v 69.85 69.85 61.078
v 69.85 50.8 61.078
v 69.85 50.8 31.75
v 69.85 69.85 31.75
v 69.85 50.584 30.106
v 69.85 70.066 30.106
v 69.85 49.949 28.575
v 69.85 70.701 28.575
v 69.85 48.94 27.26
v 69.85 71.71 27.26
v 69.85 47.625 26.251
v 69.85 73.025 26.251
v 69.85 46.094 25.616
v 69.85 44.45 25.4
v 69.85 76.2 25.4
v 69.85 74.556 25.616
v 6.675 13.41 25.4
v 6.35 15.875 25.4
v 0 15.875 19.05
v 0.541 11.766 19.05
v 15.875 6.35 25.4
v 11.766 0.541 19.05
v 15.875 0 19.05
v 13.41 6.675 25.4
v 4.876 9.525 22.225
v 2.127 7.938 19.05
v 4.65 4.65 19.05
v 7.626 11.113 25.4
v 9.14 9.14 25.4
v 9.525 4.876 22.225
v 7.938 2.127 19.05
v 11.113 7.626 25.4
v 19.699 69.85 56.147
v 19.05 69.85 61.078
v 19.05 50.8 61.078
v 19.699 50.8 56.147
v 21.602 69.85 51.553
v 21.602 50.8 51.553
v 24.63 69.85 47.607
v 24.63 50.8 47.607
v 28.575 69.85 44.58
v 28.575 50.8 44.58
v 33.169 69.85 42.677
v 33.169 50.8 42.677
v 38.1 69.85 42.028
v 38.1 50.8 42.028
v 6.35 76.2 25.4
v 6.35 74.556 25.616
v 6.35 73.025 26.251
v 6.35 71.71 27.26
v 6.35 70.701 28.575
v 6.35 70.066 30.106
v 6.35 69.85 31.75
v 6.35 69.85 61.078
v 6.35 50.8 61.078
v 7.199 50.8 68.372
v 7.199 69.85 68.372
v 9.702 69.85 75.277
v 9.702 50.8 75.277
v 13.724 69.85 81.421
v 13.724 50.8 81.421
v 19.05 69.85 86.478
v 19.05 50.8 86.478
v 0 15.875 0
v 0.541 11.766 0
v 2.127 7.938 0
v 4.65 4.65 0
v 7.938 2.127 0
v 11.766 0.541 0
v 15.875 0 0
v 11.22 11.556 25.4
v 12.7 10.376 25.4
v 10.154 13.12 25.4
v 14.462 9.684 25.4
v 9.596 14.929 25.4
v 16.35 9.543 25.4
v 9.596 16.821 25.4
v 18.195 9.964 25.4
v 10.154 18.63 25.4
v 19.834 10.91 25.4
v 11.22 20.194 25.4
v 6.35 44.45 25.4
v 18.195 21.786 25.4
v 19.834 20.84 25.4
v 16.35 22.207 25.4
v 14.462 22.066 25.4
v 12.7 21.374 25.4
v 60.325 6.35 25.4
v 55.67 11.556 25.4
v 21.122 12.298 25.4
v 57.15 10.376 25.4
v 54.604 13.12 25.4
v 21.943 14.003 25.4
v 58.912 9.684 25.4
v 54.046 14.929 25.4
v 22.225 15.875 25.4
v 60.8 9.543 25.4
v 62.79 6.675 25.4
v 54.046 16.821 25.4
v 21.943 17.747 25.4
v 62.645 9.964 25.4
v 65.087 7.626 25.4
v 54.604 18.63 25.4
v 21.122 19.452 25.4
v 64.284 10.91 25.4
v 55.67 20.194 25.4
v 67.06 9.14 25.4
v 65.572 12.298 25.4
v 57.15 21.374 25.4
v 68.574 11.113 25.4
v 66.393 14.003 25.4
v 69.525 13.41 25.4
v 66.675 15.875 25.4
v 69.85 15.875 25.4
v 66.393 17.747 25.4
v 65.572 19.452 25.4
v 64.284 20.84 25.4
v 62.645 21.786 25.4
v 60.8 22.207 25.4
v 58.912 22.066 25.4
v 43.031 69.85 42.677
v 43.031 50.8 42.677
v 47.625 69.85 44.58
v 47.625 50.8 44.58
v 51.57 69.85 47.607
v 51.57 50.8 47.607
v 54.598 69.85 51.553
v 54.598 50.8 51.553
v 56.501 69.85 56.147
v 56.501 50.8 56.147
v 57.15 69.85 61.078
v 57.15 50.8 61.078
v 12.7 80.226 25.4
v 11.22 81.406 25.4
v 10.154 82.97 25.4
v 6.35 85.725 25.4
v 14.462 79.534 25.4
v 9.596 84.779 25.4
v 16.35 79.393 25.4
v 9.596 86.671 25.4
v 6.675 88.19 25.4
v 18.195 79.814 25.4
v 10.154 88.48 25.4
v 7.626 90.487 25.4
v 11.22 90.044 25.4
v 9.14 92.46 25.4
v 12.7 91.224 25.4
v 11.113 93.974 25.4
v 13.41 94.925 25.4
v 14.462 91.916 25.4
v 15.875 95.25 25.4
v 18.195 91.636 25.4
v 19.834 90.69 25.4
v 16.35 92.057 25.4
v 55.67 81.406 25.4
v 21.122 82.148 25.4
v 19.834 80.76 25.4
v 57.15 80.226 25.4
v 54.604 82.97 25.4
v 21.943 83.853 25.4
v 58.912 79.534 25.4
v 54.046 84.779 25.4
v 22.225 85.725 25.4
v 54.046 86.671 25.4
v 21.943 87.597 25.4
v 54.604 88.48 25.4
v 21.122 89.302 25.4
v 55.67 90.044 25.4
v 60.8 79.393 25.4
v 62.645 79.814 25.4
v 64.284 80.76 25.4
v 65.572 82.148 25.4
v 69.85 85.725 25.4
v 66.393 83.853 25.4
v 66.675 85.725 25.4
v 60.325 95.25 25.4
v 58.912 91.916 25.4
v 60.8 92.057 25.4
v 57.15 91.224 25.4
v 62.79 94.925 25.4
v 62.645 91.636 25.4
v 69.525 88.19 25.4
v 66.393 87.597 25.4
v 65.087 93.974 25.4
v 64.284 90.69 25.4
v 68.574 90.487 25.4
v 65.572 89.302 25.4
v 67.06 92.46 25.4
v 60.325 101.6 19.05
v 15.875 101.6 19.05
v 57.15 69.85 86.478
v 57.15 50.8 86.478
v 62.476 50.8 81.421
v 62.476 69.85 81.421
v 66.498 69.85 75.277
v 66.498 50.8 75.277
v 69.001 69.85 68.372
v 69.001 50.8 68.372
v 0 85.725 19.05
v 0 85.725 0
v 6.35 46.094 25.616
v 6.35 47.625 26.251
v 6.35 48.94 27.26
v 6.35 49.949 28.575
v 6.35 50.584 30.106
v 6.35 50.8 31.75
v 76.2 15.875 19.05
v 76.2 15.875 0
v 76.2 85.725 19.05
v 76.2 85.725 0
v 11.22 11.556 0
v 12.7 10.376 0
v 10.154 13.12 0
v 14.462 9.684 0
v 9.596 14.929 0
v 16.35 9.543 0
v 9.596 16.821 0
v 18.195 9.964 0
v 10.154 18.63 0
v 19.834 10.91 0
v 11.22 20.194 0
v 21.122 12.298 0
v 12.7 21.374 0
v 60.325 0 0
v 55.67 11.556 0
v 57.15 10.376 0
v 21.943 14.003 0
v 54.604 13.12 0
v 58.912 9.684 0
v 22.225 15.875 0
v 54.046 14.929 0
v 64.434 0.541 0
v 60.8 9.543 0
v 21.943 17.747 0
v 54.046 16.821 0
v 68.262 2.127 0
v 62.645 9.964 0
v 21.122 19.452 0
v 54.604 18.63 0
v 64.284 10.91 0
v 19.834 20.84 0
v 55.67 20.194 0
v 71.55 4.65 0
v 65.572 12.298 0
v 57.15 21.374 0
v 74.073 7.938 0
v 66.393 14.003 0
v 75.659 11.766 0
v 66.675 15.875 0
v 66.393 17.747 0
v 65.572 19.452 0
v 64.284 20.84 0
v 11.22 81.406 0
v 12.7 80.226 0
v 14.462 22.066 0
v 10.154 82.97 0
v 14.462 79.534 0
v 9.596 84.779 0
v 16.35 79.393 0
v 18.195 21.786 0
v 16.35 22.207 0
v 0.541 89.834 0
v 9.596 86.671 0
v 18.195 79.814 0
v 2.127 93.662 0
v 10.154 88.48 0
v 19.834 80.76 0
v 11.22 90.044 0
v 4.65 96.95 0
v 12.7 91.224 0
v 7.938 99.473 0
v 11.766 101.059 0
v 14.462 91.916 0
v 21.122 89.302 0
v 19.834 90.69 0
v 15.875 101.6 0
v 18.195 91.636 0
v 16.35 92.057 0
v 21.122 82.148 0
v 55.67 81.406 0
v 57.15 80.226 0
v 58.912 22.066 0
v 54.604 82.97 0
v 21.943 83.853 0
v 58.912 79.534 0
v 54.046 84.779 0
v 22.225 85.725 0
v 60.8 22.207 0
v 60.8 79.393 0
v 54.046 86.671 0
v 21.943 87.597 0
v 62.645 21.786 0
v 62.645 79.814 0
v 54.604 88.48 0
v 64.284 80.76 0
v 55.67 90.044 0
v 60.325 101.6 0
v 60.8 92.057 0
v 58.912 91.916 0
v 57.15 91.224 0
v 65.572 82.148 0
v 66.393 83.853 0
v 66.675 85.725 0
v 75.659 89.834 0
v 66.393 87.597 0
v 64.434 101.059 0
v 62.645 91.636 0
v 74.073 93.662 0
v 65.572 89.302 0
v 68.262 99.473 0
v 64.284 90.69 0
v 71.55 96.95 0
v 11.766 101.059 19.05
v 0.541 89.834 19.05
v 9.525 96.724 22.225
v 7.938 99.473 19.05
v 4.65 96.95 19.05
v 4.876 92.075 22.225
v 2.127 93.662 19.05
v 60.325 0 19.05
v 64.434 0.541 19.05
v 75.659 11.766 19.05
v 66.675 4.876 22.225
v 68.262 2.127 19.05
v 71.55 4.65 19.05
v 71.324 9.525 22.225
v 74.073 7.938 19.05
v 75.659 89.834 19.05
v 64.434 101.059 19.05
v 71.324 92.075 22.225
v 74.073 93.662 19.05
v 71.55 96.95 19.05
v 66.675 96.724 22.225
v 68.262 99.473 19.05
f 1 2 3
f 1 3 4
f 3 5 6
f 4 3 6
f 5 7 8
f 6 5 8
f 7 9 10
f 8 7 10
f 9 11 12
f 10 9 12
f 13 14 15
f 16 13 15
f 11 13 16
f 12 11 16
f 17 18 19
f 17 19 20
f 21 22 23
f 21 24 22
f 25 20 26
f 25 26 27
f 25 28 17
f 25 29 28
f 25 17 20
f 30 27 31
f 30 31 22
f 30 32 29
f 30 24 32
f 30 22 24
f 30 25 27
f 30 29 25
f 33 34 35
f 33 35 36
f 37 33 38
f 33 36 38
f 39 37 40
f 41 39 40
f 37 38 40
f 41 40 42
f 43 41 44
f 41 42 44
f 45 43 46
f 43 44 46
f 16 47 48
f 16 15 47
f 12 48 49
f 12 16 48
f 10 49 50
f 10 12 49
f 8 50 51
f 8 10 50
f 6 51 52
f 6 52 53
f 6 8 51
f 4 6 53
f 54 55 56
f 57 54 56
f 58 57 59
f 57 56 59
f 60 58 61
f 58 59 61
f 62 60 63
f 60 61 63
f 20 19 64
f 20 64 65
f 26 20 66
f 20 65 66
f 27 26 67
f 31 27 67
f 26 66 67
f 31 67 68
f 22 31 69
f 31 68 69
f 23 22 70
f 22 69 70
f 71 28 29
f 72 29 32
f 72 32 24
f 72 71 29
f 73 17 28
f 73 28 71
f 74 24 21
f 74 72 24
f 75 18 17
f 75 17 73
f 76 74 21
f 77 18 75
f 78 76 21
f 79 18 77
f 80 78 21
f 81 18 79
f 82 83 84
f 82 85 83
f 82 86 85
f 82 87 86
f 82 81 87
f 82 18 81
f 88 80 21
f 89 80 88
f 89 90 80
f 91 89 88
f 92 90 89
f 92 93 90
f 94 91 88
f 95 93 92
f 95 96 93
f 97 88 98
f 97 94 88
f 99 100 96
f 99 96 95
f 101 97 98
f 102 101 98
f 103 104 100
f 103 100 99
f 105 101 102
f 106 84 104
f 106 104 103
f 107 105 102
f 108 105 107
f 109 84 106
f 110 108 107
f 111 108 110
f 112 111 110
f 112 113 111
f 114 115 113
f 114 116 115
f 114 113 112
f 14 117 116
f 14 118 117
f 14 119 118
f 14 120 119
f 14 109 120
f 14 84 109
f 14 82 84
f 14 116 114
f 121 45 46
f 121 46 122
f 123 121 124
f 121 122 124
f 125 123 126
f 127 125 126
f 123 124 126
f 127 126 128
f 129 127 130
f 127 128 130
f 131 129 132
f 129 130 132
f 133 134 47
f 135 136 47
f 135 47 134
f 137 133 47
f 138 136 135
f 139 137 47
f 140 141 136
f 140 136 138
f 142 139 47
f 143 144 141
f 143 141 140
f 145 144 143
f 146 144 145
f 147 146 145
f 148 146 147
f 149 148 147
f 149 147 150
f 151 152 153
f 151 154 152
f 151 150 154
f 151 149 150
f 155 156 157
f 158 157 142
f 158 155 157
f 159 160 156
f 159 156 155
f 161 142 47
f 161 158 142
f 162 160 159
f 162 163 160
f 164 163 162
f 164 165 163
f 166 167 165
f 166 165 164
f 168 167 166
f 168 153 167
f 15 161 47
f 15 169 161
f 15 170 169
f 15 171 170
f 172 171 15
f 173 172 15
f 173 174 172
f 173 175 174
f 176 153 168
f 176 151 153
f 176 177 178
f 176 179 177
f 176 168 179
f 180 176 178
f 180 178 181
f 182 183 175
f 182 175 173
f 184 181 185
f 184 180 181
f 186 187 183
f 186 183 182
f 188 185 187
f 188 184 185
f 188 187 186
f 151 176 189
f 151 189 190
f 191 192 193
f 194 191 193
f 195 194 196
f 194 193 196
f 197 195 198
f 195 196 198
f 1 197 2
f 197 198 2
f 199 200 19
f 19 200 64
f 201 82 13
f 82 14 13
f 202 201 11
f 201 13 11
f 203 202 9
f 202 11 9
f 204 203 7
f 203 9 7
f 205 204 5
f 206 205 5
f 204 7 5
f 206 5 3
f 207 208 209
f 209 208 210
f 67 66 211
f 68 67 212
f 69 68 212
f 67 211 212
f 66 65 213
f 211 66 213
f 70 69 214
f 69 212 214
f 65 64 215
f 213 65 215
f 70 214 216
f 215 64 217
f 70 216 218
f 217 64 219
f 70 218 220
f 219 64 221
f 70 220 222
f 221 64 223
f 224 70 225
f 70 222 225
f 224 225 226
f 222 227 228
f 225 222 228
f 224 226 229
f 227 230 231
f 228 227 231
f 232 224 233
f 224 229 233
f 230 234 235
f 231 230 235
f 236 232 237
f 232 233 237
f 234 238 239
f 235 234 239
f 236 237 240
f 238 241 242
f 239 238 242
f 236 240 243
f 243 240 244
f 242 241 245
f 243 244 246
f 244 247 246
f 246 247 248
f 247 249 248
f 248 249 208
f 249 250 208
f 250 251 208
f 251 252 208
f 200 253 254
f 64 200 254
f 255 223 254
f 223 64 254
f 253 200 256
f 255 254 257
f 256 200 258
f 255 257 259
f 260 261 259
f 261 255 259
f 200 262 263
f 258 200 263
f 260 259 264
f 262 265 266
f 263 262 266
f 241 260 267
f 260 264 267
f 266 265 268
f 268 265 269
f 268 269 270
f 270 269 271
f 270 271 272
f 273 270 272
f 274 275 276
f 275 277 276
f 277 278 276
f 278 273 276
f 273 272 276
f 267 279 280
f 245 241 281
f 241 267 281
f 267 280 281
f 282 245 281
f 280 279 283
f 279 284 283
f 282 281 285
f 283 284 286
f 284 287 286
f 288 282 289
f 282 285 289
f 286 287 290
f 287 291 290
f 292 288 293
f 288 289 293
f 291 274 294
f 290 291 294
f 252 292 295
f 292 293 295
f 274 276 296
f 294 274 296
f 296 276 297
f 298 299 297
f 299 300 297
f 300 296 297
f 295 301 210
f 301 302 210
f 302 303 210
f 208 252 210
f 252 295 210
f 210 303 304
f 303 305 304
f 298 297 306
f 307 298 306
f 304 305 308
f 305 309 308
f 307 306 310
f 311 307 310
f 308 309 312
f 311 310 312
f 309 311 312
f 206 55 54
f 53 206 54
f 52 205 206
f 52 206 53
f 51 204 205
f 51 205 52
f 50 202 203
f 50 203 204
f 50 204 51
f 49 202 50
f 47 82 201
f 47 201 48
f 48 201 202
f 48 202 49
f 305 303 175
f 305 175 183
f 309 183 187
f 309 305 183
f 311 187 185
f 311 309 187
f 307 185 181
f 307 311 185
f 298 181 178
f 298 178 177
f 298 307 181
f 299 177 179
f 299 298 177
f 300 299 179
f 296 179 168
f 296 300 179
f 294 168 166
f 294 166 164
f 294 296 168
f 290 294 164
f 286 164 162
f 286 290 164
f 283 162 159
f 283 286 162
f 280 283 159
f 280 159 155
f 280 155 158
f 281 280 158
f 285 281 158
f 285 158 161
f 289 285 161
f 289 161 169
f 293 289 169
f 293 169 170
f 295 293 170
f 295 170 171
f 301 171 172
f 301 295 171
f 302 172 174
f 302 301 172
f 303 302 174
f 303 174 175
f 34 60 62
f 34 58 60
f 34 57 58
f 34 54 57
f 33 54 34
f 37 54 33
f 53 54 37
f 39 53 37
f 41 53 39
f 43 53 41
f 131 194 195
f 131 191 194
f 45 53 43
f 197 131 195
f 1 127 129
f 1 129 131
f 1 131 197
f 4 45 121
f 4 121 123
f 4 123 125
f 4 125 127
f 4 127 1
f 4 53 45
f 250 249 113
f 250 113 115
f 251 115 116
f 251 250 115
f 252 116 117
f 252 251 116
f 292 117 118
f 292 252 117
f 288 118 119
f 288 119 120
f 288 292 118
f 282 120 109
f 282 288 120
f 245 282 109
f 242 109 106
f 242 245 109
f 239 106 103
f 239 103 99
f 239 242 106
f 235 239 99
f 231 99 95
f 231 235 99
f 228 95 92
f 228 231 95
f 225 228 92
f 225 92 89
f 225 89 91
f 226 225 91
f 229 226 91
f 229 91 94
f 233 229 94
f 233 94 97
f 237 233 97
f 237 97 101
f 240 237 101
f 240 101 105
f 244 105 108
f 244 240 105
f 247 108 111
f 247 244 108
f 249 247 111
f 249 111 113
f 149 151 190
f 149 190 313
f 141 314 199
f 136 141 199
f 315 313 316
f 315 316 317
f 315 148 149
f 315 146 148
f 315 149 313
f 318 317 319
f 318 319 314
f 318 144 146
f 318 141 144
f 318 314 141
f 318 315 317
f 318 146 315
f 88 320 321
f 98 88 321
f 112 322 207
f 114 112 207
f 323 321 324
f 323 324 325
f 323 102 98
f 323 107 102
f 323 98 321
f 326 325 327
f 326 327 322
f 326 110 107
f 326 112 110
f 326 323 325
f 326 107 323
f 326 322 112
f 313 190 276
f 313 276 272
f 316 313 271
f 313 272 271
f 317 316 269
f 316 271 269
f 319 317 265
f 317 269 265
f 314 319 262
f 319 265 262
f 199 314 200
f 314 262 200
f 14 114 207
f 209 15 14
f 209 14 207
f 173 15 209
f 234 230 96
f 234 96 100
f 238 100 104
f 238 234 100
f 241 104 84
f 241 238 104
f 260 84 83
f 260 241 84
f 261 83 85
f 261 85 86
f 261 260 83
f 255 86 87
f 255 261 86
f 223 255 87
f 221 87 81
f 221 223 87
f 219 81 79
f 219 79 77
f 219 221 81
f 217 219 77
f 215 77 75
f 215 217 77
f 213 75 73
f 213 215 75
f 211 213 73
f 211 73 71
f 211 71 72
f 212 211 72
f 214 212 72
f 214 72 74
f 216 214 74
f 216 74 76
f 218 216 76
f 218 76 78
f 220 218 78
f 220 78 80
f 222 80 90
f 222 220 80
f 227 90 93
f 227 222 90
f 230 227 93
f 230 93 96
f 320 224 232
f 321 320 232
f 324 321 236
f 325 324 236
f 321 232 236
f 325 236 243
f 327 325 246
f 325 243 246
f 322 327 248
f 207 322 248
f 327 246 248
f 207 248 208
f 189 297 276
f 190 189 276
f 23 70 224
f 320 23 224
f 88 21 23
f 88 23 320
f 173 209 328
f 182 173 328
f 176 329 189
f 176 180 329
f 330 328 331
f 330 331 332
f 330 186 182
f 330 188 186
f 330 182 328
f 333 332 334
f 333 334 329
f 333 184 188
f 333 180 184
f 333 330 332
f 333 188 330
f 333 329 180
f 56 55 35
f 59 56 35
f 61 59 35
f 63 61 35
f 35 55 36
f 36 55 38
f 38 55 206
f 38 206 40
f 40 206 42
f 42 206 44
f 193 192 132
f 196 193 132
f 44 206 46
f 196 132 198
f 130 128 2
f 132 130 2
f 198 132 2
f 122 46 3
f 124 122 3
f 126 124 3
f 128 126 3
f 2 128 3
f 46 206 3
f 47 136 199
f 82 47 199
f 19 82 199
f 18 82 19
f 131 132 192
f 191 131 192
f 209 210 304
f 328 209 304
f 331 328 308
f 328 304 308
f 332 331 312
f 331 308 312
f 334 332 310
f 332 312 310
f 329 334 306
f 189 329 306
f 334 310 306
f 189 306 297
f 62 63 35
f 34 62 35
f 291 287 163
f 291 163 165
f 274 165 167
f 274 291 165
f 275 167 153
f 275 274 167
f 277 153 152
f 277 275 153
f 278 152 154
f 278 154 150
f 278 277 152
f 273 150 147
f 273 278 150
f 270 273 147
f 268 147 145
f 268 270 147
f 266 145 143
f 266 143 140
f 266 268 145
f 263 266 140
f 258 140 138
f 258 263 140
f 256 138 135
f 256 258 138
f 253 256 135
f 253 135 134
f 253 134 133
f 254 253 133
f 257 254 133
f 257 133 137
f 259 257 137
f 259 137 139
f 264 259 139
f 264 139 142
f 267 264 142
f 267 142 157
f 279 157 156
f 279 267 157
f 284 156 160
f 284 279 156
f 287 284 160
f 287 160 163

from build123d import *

# Parameters (mm, degrees)
F0_R     = 6.35
F1_DEPTH = 25.4
F2_SIZE  = 6.35
F3_W     = 63.5
F3_H     = 19.05
F4_DEPTH = 95.25
F5_R     = 6.35
F7_DEPTH = 50.801


with BuildPart() as f1:
    # F0 (on Top) → F1 (new body)
    with BuildSketch(Plane.XY):
        with BuildLine():
            ThreePointArc((0, 15.875), (4.6496798487, 4.6496798487), (15.875, 0))
            Line((15.875, 0), (60.325, 0))
            ThreePointArc((60.325, 0), (71.5503201513, 4.6496798487), (76.2, 15.875))
            Line((76.2, 15.875), (76.2, 85.725))
            ThreePointArc((76.2, 85.725), (71.5503201513, 96.9503201513), (60.325, 101.6))
            Line((60.325, 101.6), (15.875, 101.6))
            ThreePointArc((15.875, 101.6), (4.6496798487, 96.9503201513), (0, 85.725))
            Line((0, 85.725), (0, 15.875))
        make_face()
        with Locations((15.875, 15.875)):
            Circle(F0_R, mode=Mode.SUBTRACT)
        with Locations((60.325, 15.875)):
            Circle(F0_R, mode=Mode.SUBTRACT)
        with Locations((15.875, 85.725)):
            Circle(F0_R, mode=Mode.SUBTRACT)
        with Locations((60.325, 85.725)):
            Circle(F0_R, mode=Mode.SUBTRACT)
    extrude(amount=F1_DEPTH)

    # F2
    f2_edges = [f1.edges().sort_by_distance(p)[0] for p in [
        (38.1, 0, 25.4),
        (0, 50.8, 25.4),
        (4.64968, 4.64968, 25.4),
        (71.55032, 4.64968, 25.4),
        (76.2, 50.8, 25.4),
        (71.55032, 96.95032, 25.4),
        (38.1, 101.6, 25.4),
        (4.64968, 96.95032, 25.4),
    ]]
    chamfer(f2_edges, length=F2_SIZE)

    # F3 (on face) → F4 (join)
    with BuildSketch(Plane.XY.offset(25.4)):
        with Locations((38.1, 60.325)):
            Rectangle(F3_W, F3_H)
    extrude(amount=F4_DEPTH)

    # F5
    f5_edges = [f1.edges().sort_by_distance(p)[0] for p in [
        (38.1, 50.8, 25.4),
        (38.1, 69.85, 25.4),
    ]]
    fillet(f5_edges, radius=F5_R)

    # F6 (on face) → F7 (cut, through all)
    with BuildSketch(Plane.XZ.offset(-50.8)):
        with BuildLine():
            Line((6.35, 120.65), (6.35, 61.0775296334))
            ThreePointArc((6.35, 61.0775296334), (9.7019366858, 75.2765612905), (19.05, 86.4775296334))
            Line((19.05, 86.4775296334), (19.05, 120.65))
            Line((19.05, 120.65), (6.35, 120.65))
        make_face()
        with BuildLine():
            ThreePointArc((57.15, 61.0775296334), (38.1, 80.1275296334), (19.05, 61.0775296334))
            Line((19.05, 61.0775296334), (38.1, 61.0775296334))
            Line((38.1, 61.0775296334), (38.1, 42.0275296334))
            ThreePointArc((38.1, 42.0275296334), (51.5703841816, 47.6071454518), (57.15, 61.0775296334))
        make_face()
        with BuildLine():
            Line((19.05, 86.4775296334), (19.05, 61.0775296334))
            ThreePointArc((19.05, 61.0775296334), (38.1, 80.1275296334), (57.15, 61.0775296334))
            Line((57.15, 61.0775296334), (57.15, 86.4775296334))
            ThreePointArc((57.15, 86.4775296334), (38.1, 92.8275296334), (19.05, 86.4775296334))
        make_face()
        with BuildLine():
            Line((38.1, 61.0775296334), (19.05, 61.0775296334))
            ThreePointArc((19.05, 61.0775296334), (24.6296158184, 47.6071454518), (38.1, 42.0275296334))
            Line((38.1, 42.0275296334), (38.1, 61.0775296334))
        make_face()
        with BuildLine():
            Line((19.05, 120.65), (19.05, 86.4775296334))
            ThreePointArc((19.05, 86.4775296334), (38.1, 92.8275296334), (57.15, 86.4775296334))
            Line((57.15, 86.4775296334), (57.15, 120.65))
            Line((57.15, 120.65), (19.05, 120.65))
        make_face()
        with BuildLine():
            ThreePointArc((57.15, 86.4775296334), (66.4980633142, 75.2765612905), (69.85, 61.0775296334))
            Line((69.85, 61.0775296334), (69.85, 120.65))
            Line((69.85, 120.65), (57.15, 120.65))
            Line((57.15, 120.65), (57.15, 86.4775296334))
        make_face()
    extrude(amount=-F7_DEPTH, mode=Mode.SUBTRACT)


solid = f1.part
